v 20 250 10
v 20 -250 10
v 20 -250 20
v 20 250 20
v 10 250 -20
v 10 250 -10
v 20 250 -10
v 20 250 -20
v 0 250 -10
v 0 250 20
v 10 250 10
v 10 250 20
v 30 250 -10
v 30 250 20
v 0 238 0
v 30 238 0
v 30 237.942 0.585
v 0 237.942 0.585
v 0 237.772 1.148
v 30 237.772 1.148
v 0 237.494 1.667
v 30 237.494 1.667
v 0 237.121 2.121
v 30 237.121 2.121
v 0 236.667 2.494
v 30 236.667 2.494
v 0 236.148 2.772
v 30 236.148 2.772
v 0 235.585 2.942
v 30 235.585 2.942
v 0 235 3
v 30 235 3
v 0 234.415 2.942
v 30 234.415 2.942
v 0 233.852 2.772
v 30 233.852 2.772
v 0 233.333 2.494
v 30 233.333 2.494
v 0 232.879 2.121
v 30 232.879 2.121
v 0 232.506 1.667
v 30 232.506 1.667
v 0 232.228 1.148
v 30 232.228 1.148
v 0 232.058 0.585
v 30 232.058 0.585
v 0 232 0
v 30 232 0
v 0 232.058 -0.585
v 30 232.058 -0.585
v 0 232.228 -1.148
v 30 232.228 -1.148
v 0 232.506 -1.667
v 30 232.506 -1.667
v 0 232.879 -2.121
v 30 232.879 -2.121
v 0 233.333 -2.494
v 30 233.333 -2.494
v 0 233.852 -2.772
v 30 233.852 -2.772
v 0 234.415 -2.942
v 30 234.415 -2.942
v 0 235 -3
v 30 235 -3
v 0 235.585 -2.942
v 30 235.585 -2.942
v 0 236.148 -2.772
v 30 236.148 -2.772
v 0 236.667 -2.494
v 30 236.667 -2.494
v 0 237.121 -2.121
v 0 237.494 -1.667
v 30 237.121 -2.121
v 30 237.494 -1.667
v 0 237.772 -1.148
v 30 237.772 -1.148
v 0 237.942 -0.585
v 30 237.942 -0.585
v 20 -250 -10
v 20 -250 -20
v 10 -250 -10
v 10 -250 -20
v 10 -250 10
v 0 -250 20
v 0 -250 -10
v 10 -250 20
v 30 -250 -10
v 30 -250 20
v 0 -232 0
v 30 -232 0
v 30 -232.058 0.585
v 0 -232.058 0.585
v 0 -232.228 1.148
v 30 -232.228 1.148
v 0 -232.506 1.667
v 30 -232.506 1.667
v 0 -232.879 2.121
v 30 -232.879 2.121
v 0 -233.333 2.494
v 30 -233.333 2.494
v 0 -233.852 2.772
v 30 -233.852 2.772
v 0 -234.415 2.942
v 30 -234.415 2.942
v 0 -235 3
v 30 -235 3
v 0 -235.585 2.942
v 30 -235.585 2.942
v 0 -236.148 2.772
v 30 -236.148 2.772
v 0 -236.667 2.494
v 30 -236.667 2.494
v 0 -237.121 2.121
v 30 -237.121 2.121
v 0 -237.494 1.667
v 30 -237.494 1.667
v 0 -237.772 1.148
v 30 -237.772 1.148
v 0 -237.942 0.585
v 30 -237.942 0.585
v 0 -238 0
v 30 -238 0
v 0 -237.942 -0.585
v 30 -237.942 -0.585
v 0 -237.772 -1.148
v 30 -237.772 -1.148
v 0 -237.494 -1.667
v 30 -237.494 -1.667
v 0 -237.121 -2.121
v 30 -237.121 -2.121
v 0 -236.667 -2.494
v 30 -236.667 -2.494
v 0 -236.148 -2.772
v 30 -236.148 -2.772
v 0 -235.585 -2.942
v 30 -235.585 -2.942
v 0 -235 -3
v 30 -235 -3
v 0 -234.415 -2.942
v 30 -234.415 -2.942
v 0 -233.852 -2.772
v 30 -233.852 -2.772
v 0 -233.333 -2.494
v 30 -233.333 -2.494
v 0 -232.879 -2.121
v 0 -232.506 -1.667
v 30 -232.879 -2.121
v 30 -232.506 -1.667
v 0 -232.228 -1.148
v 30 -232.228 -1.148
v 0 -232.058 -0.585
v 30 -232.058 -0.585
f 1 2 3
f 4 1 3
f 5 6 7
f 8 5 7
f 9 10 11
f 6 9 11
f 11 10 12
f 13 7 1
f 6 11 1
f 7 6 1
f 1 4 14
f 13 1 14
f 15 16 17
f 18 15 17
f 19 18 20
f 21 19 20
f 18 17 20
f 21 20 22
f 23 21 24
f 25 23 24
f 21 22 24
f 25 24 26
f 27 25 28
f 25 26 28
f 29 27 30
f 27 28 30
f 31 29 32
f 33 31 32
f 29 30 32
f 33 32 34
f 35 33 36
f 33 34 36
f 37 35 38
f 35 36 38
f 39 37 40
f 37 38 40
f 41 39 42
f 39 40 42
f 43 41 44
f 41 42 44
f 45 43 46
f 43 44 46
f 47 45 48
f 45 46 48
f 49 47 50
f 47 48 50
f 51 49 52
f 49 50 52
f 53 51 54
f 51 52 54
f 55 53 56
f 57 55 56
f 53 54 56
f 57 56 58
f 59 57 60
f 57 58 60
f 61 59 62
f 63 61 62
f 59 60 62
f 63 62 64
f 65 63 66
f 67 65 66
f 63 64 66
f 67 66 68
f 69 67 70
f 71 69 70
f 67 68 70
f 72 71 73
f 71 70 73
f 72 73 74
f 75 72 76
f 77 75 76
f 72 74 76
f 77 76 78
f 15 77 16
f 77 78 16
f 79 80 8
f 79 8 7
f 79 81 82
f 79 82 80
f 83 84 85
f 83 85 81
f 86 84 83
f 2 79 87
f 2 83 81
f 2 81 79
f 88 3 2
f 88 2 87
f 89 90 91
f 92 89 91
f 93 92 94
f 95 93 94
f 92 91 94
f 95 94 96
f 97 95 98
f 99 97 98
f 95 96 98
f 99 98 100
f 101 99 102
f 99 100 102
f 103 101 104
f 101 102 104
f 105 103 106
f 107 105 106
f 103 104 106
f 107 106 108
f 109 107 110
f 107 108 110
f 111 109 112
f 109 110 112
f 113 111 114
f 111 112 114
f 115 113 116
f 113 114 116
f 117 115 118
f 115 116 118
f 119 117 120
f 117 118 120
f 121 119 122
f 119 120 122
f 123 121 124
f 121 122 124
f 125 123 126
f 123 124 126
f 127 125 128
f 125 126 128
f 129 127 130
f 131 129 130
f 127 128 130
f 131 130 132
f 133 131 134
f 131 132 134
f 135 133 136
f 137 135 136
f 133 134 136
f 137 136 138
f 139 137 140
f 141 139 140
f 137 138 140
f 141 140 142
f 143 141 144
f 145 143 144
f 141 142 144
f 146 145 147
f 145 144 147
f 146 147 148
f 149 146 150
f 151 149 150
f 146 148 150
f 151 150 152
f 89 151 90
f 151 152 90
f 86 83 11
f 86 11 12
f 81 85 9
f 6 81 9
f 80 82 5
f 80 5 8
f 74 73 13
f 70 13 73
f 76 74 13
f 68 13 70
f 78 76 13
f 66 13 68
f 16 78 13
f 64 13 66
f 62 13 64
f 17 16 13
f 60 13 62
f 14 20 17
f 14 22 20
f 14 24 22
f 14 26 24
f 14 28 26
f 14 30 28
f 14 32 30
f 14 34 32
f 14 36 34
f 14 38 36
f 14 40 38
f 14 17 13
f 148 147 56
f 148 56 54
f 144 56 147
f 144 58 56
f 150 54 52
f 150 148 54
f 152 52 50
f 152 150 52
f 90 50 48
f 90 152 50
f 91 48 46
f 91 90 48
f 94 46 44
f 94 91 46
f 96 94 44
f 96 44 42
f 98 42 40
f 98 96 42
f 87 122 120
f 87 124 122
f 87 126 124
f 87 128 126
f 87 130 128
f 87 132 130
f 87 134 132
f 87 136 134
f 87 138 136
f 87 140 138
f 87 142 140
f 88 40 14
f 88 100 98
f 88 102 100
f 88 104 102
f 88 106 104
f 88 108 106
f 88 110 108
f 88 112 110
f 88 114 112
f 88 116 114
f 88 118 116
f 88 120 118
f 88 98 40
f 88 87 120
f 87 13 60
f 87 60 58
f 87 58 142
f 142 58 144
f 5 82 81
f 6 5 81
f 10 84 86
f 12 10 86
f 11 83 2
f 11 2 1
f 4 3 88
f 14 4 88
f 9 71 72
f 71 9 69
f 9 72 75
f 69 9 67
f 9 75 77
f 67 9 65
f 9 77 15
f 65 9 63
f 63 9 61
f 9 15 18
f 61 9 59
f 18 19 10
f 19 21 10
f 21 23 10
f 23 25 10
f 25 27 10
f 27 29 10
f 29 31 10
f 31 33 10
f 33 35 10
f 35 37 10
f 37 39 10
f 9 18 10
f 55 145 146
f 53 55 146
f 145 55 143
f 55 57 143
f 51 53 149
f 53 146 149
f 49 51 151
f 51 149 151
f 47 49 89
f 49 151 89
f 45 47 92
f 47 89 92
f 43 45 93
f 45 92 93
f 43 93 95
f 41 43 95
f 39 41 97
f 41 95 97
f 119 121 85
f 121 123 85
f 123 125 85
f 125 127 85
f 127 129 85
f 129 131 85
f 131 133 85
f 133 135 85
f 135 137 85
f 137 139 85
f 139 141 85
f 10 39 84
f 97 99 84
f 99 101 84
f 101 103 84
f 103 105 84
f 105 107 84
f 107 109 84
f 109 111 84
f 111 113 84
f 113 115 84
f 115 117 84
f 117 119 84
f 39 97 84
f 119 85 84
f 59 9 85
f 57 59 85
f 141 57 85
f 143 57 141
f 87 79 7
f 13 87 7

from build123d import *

# Parameters (mm, degrees)
F0_W     = 500
F0_H     = 20
F1_DEPTH = 30
F2_W     = 10
F2_H     = 10
F3_DEPTH = 500
F4_W     = 10
F4_H     = 10
F5_DEPTH = 500
F6_W     = 10
F6_H     = 10
F7_DEPTH = 500
F8_R     = 3
F9_DEPTH = 30


with BuildPart() as f1:
    # F0 (on Right) → F1 (new body)
    with BuildSketch(Plane.YZ):
        Rectangle(F0_W, F0_H)
    extrude(amount=F1_DEPTH)

    # F2 (on face) → F3 (join)
    with BuildSketch(Plane.XZ.offset(250)):
        with Locations((5, 15)):
            Rectangle(F2_W, F2_H)
    extrude(amount=-F3_DEPTH)

    # F4 (on face) → F5 (join)
    with BuildSketch(Plane.XZ.offset(250)):
        with Locations((25, 15)):
            Rectangle(F4_W, F4_H)
    extrude(amount=-F5_DEPTH)

    # F6 (on face) → F7 (join)
    with BuildSketch(Plane.XZ.offset(250)):
        with Locations((15, -15)):
            Rectangle(F6_W, F6_H)
    extrude(amount=-F7_DEPTH)

    # F8 (on face) → F9 (cut)
    with BuildSketch(Plane.YZ.offset(30)):
        with Locations((-235, 0)):
            Circle(F8_R)
        with Locations((235, 0)):
            Circle(F8_R)
    extrude(amount=-F9_DEPTH, mode=Mode.SUBTRACT)


solid = f1.part
